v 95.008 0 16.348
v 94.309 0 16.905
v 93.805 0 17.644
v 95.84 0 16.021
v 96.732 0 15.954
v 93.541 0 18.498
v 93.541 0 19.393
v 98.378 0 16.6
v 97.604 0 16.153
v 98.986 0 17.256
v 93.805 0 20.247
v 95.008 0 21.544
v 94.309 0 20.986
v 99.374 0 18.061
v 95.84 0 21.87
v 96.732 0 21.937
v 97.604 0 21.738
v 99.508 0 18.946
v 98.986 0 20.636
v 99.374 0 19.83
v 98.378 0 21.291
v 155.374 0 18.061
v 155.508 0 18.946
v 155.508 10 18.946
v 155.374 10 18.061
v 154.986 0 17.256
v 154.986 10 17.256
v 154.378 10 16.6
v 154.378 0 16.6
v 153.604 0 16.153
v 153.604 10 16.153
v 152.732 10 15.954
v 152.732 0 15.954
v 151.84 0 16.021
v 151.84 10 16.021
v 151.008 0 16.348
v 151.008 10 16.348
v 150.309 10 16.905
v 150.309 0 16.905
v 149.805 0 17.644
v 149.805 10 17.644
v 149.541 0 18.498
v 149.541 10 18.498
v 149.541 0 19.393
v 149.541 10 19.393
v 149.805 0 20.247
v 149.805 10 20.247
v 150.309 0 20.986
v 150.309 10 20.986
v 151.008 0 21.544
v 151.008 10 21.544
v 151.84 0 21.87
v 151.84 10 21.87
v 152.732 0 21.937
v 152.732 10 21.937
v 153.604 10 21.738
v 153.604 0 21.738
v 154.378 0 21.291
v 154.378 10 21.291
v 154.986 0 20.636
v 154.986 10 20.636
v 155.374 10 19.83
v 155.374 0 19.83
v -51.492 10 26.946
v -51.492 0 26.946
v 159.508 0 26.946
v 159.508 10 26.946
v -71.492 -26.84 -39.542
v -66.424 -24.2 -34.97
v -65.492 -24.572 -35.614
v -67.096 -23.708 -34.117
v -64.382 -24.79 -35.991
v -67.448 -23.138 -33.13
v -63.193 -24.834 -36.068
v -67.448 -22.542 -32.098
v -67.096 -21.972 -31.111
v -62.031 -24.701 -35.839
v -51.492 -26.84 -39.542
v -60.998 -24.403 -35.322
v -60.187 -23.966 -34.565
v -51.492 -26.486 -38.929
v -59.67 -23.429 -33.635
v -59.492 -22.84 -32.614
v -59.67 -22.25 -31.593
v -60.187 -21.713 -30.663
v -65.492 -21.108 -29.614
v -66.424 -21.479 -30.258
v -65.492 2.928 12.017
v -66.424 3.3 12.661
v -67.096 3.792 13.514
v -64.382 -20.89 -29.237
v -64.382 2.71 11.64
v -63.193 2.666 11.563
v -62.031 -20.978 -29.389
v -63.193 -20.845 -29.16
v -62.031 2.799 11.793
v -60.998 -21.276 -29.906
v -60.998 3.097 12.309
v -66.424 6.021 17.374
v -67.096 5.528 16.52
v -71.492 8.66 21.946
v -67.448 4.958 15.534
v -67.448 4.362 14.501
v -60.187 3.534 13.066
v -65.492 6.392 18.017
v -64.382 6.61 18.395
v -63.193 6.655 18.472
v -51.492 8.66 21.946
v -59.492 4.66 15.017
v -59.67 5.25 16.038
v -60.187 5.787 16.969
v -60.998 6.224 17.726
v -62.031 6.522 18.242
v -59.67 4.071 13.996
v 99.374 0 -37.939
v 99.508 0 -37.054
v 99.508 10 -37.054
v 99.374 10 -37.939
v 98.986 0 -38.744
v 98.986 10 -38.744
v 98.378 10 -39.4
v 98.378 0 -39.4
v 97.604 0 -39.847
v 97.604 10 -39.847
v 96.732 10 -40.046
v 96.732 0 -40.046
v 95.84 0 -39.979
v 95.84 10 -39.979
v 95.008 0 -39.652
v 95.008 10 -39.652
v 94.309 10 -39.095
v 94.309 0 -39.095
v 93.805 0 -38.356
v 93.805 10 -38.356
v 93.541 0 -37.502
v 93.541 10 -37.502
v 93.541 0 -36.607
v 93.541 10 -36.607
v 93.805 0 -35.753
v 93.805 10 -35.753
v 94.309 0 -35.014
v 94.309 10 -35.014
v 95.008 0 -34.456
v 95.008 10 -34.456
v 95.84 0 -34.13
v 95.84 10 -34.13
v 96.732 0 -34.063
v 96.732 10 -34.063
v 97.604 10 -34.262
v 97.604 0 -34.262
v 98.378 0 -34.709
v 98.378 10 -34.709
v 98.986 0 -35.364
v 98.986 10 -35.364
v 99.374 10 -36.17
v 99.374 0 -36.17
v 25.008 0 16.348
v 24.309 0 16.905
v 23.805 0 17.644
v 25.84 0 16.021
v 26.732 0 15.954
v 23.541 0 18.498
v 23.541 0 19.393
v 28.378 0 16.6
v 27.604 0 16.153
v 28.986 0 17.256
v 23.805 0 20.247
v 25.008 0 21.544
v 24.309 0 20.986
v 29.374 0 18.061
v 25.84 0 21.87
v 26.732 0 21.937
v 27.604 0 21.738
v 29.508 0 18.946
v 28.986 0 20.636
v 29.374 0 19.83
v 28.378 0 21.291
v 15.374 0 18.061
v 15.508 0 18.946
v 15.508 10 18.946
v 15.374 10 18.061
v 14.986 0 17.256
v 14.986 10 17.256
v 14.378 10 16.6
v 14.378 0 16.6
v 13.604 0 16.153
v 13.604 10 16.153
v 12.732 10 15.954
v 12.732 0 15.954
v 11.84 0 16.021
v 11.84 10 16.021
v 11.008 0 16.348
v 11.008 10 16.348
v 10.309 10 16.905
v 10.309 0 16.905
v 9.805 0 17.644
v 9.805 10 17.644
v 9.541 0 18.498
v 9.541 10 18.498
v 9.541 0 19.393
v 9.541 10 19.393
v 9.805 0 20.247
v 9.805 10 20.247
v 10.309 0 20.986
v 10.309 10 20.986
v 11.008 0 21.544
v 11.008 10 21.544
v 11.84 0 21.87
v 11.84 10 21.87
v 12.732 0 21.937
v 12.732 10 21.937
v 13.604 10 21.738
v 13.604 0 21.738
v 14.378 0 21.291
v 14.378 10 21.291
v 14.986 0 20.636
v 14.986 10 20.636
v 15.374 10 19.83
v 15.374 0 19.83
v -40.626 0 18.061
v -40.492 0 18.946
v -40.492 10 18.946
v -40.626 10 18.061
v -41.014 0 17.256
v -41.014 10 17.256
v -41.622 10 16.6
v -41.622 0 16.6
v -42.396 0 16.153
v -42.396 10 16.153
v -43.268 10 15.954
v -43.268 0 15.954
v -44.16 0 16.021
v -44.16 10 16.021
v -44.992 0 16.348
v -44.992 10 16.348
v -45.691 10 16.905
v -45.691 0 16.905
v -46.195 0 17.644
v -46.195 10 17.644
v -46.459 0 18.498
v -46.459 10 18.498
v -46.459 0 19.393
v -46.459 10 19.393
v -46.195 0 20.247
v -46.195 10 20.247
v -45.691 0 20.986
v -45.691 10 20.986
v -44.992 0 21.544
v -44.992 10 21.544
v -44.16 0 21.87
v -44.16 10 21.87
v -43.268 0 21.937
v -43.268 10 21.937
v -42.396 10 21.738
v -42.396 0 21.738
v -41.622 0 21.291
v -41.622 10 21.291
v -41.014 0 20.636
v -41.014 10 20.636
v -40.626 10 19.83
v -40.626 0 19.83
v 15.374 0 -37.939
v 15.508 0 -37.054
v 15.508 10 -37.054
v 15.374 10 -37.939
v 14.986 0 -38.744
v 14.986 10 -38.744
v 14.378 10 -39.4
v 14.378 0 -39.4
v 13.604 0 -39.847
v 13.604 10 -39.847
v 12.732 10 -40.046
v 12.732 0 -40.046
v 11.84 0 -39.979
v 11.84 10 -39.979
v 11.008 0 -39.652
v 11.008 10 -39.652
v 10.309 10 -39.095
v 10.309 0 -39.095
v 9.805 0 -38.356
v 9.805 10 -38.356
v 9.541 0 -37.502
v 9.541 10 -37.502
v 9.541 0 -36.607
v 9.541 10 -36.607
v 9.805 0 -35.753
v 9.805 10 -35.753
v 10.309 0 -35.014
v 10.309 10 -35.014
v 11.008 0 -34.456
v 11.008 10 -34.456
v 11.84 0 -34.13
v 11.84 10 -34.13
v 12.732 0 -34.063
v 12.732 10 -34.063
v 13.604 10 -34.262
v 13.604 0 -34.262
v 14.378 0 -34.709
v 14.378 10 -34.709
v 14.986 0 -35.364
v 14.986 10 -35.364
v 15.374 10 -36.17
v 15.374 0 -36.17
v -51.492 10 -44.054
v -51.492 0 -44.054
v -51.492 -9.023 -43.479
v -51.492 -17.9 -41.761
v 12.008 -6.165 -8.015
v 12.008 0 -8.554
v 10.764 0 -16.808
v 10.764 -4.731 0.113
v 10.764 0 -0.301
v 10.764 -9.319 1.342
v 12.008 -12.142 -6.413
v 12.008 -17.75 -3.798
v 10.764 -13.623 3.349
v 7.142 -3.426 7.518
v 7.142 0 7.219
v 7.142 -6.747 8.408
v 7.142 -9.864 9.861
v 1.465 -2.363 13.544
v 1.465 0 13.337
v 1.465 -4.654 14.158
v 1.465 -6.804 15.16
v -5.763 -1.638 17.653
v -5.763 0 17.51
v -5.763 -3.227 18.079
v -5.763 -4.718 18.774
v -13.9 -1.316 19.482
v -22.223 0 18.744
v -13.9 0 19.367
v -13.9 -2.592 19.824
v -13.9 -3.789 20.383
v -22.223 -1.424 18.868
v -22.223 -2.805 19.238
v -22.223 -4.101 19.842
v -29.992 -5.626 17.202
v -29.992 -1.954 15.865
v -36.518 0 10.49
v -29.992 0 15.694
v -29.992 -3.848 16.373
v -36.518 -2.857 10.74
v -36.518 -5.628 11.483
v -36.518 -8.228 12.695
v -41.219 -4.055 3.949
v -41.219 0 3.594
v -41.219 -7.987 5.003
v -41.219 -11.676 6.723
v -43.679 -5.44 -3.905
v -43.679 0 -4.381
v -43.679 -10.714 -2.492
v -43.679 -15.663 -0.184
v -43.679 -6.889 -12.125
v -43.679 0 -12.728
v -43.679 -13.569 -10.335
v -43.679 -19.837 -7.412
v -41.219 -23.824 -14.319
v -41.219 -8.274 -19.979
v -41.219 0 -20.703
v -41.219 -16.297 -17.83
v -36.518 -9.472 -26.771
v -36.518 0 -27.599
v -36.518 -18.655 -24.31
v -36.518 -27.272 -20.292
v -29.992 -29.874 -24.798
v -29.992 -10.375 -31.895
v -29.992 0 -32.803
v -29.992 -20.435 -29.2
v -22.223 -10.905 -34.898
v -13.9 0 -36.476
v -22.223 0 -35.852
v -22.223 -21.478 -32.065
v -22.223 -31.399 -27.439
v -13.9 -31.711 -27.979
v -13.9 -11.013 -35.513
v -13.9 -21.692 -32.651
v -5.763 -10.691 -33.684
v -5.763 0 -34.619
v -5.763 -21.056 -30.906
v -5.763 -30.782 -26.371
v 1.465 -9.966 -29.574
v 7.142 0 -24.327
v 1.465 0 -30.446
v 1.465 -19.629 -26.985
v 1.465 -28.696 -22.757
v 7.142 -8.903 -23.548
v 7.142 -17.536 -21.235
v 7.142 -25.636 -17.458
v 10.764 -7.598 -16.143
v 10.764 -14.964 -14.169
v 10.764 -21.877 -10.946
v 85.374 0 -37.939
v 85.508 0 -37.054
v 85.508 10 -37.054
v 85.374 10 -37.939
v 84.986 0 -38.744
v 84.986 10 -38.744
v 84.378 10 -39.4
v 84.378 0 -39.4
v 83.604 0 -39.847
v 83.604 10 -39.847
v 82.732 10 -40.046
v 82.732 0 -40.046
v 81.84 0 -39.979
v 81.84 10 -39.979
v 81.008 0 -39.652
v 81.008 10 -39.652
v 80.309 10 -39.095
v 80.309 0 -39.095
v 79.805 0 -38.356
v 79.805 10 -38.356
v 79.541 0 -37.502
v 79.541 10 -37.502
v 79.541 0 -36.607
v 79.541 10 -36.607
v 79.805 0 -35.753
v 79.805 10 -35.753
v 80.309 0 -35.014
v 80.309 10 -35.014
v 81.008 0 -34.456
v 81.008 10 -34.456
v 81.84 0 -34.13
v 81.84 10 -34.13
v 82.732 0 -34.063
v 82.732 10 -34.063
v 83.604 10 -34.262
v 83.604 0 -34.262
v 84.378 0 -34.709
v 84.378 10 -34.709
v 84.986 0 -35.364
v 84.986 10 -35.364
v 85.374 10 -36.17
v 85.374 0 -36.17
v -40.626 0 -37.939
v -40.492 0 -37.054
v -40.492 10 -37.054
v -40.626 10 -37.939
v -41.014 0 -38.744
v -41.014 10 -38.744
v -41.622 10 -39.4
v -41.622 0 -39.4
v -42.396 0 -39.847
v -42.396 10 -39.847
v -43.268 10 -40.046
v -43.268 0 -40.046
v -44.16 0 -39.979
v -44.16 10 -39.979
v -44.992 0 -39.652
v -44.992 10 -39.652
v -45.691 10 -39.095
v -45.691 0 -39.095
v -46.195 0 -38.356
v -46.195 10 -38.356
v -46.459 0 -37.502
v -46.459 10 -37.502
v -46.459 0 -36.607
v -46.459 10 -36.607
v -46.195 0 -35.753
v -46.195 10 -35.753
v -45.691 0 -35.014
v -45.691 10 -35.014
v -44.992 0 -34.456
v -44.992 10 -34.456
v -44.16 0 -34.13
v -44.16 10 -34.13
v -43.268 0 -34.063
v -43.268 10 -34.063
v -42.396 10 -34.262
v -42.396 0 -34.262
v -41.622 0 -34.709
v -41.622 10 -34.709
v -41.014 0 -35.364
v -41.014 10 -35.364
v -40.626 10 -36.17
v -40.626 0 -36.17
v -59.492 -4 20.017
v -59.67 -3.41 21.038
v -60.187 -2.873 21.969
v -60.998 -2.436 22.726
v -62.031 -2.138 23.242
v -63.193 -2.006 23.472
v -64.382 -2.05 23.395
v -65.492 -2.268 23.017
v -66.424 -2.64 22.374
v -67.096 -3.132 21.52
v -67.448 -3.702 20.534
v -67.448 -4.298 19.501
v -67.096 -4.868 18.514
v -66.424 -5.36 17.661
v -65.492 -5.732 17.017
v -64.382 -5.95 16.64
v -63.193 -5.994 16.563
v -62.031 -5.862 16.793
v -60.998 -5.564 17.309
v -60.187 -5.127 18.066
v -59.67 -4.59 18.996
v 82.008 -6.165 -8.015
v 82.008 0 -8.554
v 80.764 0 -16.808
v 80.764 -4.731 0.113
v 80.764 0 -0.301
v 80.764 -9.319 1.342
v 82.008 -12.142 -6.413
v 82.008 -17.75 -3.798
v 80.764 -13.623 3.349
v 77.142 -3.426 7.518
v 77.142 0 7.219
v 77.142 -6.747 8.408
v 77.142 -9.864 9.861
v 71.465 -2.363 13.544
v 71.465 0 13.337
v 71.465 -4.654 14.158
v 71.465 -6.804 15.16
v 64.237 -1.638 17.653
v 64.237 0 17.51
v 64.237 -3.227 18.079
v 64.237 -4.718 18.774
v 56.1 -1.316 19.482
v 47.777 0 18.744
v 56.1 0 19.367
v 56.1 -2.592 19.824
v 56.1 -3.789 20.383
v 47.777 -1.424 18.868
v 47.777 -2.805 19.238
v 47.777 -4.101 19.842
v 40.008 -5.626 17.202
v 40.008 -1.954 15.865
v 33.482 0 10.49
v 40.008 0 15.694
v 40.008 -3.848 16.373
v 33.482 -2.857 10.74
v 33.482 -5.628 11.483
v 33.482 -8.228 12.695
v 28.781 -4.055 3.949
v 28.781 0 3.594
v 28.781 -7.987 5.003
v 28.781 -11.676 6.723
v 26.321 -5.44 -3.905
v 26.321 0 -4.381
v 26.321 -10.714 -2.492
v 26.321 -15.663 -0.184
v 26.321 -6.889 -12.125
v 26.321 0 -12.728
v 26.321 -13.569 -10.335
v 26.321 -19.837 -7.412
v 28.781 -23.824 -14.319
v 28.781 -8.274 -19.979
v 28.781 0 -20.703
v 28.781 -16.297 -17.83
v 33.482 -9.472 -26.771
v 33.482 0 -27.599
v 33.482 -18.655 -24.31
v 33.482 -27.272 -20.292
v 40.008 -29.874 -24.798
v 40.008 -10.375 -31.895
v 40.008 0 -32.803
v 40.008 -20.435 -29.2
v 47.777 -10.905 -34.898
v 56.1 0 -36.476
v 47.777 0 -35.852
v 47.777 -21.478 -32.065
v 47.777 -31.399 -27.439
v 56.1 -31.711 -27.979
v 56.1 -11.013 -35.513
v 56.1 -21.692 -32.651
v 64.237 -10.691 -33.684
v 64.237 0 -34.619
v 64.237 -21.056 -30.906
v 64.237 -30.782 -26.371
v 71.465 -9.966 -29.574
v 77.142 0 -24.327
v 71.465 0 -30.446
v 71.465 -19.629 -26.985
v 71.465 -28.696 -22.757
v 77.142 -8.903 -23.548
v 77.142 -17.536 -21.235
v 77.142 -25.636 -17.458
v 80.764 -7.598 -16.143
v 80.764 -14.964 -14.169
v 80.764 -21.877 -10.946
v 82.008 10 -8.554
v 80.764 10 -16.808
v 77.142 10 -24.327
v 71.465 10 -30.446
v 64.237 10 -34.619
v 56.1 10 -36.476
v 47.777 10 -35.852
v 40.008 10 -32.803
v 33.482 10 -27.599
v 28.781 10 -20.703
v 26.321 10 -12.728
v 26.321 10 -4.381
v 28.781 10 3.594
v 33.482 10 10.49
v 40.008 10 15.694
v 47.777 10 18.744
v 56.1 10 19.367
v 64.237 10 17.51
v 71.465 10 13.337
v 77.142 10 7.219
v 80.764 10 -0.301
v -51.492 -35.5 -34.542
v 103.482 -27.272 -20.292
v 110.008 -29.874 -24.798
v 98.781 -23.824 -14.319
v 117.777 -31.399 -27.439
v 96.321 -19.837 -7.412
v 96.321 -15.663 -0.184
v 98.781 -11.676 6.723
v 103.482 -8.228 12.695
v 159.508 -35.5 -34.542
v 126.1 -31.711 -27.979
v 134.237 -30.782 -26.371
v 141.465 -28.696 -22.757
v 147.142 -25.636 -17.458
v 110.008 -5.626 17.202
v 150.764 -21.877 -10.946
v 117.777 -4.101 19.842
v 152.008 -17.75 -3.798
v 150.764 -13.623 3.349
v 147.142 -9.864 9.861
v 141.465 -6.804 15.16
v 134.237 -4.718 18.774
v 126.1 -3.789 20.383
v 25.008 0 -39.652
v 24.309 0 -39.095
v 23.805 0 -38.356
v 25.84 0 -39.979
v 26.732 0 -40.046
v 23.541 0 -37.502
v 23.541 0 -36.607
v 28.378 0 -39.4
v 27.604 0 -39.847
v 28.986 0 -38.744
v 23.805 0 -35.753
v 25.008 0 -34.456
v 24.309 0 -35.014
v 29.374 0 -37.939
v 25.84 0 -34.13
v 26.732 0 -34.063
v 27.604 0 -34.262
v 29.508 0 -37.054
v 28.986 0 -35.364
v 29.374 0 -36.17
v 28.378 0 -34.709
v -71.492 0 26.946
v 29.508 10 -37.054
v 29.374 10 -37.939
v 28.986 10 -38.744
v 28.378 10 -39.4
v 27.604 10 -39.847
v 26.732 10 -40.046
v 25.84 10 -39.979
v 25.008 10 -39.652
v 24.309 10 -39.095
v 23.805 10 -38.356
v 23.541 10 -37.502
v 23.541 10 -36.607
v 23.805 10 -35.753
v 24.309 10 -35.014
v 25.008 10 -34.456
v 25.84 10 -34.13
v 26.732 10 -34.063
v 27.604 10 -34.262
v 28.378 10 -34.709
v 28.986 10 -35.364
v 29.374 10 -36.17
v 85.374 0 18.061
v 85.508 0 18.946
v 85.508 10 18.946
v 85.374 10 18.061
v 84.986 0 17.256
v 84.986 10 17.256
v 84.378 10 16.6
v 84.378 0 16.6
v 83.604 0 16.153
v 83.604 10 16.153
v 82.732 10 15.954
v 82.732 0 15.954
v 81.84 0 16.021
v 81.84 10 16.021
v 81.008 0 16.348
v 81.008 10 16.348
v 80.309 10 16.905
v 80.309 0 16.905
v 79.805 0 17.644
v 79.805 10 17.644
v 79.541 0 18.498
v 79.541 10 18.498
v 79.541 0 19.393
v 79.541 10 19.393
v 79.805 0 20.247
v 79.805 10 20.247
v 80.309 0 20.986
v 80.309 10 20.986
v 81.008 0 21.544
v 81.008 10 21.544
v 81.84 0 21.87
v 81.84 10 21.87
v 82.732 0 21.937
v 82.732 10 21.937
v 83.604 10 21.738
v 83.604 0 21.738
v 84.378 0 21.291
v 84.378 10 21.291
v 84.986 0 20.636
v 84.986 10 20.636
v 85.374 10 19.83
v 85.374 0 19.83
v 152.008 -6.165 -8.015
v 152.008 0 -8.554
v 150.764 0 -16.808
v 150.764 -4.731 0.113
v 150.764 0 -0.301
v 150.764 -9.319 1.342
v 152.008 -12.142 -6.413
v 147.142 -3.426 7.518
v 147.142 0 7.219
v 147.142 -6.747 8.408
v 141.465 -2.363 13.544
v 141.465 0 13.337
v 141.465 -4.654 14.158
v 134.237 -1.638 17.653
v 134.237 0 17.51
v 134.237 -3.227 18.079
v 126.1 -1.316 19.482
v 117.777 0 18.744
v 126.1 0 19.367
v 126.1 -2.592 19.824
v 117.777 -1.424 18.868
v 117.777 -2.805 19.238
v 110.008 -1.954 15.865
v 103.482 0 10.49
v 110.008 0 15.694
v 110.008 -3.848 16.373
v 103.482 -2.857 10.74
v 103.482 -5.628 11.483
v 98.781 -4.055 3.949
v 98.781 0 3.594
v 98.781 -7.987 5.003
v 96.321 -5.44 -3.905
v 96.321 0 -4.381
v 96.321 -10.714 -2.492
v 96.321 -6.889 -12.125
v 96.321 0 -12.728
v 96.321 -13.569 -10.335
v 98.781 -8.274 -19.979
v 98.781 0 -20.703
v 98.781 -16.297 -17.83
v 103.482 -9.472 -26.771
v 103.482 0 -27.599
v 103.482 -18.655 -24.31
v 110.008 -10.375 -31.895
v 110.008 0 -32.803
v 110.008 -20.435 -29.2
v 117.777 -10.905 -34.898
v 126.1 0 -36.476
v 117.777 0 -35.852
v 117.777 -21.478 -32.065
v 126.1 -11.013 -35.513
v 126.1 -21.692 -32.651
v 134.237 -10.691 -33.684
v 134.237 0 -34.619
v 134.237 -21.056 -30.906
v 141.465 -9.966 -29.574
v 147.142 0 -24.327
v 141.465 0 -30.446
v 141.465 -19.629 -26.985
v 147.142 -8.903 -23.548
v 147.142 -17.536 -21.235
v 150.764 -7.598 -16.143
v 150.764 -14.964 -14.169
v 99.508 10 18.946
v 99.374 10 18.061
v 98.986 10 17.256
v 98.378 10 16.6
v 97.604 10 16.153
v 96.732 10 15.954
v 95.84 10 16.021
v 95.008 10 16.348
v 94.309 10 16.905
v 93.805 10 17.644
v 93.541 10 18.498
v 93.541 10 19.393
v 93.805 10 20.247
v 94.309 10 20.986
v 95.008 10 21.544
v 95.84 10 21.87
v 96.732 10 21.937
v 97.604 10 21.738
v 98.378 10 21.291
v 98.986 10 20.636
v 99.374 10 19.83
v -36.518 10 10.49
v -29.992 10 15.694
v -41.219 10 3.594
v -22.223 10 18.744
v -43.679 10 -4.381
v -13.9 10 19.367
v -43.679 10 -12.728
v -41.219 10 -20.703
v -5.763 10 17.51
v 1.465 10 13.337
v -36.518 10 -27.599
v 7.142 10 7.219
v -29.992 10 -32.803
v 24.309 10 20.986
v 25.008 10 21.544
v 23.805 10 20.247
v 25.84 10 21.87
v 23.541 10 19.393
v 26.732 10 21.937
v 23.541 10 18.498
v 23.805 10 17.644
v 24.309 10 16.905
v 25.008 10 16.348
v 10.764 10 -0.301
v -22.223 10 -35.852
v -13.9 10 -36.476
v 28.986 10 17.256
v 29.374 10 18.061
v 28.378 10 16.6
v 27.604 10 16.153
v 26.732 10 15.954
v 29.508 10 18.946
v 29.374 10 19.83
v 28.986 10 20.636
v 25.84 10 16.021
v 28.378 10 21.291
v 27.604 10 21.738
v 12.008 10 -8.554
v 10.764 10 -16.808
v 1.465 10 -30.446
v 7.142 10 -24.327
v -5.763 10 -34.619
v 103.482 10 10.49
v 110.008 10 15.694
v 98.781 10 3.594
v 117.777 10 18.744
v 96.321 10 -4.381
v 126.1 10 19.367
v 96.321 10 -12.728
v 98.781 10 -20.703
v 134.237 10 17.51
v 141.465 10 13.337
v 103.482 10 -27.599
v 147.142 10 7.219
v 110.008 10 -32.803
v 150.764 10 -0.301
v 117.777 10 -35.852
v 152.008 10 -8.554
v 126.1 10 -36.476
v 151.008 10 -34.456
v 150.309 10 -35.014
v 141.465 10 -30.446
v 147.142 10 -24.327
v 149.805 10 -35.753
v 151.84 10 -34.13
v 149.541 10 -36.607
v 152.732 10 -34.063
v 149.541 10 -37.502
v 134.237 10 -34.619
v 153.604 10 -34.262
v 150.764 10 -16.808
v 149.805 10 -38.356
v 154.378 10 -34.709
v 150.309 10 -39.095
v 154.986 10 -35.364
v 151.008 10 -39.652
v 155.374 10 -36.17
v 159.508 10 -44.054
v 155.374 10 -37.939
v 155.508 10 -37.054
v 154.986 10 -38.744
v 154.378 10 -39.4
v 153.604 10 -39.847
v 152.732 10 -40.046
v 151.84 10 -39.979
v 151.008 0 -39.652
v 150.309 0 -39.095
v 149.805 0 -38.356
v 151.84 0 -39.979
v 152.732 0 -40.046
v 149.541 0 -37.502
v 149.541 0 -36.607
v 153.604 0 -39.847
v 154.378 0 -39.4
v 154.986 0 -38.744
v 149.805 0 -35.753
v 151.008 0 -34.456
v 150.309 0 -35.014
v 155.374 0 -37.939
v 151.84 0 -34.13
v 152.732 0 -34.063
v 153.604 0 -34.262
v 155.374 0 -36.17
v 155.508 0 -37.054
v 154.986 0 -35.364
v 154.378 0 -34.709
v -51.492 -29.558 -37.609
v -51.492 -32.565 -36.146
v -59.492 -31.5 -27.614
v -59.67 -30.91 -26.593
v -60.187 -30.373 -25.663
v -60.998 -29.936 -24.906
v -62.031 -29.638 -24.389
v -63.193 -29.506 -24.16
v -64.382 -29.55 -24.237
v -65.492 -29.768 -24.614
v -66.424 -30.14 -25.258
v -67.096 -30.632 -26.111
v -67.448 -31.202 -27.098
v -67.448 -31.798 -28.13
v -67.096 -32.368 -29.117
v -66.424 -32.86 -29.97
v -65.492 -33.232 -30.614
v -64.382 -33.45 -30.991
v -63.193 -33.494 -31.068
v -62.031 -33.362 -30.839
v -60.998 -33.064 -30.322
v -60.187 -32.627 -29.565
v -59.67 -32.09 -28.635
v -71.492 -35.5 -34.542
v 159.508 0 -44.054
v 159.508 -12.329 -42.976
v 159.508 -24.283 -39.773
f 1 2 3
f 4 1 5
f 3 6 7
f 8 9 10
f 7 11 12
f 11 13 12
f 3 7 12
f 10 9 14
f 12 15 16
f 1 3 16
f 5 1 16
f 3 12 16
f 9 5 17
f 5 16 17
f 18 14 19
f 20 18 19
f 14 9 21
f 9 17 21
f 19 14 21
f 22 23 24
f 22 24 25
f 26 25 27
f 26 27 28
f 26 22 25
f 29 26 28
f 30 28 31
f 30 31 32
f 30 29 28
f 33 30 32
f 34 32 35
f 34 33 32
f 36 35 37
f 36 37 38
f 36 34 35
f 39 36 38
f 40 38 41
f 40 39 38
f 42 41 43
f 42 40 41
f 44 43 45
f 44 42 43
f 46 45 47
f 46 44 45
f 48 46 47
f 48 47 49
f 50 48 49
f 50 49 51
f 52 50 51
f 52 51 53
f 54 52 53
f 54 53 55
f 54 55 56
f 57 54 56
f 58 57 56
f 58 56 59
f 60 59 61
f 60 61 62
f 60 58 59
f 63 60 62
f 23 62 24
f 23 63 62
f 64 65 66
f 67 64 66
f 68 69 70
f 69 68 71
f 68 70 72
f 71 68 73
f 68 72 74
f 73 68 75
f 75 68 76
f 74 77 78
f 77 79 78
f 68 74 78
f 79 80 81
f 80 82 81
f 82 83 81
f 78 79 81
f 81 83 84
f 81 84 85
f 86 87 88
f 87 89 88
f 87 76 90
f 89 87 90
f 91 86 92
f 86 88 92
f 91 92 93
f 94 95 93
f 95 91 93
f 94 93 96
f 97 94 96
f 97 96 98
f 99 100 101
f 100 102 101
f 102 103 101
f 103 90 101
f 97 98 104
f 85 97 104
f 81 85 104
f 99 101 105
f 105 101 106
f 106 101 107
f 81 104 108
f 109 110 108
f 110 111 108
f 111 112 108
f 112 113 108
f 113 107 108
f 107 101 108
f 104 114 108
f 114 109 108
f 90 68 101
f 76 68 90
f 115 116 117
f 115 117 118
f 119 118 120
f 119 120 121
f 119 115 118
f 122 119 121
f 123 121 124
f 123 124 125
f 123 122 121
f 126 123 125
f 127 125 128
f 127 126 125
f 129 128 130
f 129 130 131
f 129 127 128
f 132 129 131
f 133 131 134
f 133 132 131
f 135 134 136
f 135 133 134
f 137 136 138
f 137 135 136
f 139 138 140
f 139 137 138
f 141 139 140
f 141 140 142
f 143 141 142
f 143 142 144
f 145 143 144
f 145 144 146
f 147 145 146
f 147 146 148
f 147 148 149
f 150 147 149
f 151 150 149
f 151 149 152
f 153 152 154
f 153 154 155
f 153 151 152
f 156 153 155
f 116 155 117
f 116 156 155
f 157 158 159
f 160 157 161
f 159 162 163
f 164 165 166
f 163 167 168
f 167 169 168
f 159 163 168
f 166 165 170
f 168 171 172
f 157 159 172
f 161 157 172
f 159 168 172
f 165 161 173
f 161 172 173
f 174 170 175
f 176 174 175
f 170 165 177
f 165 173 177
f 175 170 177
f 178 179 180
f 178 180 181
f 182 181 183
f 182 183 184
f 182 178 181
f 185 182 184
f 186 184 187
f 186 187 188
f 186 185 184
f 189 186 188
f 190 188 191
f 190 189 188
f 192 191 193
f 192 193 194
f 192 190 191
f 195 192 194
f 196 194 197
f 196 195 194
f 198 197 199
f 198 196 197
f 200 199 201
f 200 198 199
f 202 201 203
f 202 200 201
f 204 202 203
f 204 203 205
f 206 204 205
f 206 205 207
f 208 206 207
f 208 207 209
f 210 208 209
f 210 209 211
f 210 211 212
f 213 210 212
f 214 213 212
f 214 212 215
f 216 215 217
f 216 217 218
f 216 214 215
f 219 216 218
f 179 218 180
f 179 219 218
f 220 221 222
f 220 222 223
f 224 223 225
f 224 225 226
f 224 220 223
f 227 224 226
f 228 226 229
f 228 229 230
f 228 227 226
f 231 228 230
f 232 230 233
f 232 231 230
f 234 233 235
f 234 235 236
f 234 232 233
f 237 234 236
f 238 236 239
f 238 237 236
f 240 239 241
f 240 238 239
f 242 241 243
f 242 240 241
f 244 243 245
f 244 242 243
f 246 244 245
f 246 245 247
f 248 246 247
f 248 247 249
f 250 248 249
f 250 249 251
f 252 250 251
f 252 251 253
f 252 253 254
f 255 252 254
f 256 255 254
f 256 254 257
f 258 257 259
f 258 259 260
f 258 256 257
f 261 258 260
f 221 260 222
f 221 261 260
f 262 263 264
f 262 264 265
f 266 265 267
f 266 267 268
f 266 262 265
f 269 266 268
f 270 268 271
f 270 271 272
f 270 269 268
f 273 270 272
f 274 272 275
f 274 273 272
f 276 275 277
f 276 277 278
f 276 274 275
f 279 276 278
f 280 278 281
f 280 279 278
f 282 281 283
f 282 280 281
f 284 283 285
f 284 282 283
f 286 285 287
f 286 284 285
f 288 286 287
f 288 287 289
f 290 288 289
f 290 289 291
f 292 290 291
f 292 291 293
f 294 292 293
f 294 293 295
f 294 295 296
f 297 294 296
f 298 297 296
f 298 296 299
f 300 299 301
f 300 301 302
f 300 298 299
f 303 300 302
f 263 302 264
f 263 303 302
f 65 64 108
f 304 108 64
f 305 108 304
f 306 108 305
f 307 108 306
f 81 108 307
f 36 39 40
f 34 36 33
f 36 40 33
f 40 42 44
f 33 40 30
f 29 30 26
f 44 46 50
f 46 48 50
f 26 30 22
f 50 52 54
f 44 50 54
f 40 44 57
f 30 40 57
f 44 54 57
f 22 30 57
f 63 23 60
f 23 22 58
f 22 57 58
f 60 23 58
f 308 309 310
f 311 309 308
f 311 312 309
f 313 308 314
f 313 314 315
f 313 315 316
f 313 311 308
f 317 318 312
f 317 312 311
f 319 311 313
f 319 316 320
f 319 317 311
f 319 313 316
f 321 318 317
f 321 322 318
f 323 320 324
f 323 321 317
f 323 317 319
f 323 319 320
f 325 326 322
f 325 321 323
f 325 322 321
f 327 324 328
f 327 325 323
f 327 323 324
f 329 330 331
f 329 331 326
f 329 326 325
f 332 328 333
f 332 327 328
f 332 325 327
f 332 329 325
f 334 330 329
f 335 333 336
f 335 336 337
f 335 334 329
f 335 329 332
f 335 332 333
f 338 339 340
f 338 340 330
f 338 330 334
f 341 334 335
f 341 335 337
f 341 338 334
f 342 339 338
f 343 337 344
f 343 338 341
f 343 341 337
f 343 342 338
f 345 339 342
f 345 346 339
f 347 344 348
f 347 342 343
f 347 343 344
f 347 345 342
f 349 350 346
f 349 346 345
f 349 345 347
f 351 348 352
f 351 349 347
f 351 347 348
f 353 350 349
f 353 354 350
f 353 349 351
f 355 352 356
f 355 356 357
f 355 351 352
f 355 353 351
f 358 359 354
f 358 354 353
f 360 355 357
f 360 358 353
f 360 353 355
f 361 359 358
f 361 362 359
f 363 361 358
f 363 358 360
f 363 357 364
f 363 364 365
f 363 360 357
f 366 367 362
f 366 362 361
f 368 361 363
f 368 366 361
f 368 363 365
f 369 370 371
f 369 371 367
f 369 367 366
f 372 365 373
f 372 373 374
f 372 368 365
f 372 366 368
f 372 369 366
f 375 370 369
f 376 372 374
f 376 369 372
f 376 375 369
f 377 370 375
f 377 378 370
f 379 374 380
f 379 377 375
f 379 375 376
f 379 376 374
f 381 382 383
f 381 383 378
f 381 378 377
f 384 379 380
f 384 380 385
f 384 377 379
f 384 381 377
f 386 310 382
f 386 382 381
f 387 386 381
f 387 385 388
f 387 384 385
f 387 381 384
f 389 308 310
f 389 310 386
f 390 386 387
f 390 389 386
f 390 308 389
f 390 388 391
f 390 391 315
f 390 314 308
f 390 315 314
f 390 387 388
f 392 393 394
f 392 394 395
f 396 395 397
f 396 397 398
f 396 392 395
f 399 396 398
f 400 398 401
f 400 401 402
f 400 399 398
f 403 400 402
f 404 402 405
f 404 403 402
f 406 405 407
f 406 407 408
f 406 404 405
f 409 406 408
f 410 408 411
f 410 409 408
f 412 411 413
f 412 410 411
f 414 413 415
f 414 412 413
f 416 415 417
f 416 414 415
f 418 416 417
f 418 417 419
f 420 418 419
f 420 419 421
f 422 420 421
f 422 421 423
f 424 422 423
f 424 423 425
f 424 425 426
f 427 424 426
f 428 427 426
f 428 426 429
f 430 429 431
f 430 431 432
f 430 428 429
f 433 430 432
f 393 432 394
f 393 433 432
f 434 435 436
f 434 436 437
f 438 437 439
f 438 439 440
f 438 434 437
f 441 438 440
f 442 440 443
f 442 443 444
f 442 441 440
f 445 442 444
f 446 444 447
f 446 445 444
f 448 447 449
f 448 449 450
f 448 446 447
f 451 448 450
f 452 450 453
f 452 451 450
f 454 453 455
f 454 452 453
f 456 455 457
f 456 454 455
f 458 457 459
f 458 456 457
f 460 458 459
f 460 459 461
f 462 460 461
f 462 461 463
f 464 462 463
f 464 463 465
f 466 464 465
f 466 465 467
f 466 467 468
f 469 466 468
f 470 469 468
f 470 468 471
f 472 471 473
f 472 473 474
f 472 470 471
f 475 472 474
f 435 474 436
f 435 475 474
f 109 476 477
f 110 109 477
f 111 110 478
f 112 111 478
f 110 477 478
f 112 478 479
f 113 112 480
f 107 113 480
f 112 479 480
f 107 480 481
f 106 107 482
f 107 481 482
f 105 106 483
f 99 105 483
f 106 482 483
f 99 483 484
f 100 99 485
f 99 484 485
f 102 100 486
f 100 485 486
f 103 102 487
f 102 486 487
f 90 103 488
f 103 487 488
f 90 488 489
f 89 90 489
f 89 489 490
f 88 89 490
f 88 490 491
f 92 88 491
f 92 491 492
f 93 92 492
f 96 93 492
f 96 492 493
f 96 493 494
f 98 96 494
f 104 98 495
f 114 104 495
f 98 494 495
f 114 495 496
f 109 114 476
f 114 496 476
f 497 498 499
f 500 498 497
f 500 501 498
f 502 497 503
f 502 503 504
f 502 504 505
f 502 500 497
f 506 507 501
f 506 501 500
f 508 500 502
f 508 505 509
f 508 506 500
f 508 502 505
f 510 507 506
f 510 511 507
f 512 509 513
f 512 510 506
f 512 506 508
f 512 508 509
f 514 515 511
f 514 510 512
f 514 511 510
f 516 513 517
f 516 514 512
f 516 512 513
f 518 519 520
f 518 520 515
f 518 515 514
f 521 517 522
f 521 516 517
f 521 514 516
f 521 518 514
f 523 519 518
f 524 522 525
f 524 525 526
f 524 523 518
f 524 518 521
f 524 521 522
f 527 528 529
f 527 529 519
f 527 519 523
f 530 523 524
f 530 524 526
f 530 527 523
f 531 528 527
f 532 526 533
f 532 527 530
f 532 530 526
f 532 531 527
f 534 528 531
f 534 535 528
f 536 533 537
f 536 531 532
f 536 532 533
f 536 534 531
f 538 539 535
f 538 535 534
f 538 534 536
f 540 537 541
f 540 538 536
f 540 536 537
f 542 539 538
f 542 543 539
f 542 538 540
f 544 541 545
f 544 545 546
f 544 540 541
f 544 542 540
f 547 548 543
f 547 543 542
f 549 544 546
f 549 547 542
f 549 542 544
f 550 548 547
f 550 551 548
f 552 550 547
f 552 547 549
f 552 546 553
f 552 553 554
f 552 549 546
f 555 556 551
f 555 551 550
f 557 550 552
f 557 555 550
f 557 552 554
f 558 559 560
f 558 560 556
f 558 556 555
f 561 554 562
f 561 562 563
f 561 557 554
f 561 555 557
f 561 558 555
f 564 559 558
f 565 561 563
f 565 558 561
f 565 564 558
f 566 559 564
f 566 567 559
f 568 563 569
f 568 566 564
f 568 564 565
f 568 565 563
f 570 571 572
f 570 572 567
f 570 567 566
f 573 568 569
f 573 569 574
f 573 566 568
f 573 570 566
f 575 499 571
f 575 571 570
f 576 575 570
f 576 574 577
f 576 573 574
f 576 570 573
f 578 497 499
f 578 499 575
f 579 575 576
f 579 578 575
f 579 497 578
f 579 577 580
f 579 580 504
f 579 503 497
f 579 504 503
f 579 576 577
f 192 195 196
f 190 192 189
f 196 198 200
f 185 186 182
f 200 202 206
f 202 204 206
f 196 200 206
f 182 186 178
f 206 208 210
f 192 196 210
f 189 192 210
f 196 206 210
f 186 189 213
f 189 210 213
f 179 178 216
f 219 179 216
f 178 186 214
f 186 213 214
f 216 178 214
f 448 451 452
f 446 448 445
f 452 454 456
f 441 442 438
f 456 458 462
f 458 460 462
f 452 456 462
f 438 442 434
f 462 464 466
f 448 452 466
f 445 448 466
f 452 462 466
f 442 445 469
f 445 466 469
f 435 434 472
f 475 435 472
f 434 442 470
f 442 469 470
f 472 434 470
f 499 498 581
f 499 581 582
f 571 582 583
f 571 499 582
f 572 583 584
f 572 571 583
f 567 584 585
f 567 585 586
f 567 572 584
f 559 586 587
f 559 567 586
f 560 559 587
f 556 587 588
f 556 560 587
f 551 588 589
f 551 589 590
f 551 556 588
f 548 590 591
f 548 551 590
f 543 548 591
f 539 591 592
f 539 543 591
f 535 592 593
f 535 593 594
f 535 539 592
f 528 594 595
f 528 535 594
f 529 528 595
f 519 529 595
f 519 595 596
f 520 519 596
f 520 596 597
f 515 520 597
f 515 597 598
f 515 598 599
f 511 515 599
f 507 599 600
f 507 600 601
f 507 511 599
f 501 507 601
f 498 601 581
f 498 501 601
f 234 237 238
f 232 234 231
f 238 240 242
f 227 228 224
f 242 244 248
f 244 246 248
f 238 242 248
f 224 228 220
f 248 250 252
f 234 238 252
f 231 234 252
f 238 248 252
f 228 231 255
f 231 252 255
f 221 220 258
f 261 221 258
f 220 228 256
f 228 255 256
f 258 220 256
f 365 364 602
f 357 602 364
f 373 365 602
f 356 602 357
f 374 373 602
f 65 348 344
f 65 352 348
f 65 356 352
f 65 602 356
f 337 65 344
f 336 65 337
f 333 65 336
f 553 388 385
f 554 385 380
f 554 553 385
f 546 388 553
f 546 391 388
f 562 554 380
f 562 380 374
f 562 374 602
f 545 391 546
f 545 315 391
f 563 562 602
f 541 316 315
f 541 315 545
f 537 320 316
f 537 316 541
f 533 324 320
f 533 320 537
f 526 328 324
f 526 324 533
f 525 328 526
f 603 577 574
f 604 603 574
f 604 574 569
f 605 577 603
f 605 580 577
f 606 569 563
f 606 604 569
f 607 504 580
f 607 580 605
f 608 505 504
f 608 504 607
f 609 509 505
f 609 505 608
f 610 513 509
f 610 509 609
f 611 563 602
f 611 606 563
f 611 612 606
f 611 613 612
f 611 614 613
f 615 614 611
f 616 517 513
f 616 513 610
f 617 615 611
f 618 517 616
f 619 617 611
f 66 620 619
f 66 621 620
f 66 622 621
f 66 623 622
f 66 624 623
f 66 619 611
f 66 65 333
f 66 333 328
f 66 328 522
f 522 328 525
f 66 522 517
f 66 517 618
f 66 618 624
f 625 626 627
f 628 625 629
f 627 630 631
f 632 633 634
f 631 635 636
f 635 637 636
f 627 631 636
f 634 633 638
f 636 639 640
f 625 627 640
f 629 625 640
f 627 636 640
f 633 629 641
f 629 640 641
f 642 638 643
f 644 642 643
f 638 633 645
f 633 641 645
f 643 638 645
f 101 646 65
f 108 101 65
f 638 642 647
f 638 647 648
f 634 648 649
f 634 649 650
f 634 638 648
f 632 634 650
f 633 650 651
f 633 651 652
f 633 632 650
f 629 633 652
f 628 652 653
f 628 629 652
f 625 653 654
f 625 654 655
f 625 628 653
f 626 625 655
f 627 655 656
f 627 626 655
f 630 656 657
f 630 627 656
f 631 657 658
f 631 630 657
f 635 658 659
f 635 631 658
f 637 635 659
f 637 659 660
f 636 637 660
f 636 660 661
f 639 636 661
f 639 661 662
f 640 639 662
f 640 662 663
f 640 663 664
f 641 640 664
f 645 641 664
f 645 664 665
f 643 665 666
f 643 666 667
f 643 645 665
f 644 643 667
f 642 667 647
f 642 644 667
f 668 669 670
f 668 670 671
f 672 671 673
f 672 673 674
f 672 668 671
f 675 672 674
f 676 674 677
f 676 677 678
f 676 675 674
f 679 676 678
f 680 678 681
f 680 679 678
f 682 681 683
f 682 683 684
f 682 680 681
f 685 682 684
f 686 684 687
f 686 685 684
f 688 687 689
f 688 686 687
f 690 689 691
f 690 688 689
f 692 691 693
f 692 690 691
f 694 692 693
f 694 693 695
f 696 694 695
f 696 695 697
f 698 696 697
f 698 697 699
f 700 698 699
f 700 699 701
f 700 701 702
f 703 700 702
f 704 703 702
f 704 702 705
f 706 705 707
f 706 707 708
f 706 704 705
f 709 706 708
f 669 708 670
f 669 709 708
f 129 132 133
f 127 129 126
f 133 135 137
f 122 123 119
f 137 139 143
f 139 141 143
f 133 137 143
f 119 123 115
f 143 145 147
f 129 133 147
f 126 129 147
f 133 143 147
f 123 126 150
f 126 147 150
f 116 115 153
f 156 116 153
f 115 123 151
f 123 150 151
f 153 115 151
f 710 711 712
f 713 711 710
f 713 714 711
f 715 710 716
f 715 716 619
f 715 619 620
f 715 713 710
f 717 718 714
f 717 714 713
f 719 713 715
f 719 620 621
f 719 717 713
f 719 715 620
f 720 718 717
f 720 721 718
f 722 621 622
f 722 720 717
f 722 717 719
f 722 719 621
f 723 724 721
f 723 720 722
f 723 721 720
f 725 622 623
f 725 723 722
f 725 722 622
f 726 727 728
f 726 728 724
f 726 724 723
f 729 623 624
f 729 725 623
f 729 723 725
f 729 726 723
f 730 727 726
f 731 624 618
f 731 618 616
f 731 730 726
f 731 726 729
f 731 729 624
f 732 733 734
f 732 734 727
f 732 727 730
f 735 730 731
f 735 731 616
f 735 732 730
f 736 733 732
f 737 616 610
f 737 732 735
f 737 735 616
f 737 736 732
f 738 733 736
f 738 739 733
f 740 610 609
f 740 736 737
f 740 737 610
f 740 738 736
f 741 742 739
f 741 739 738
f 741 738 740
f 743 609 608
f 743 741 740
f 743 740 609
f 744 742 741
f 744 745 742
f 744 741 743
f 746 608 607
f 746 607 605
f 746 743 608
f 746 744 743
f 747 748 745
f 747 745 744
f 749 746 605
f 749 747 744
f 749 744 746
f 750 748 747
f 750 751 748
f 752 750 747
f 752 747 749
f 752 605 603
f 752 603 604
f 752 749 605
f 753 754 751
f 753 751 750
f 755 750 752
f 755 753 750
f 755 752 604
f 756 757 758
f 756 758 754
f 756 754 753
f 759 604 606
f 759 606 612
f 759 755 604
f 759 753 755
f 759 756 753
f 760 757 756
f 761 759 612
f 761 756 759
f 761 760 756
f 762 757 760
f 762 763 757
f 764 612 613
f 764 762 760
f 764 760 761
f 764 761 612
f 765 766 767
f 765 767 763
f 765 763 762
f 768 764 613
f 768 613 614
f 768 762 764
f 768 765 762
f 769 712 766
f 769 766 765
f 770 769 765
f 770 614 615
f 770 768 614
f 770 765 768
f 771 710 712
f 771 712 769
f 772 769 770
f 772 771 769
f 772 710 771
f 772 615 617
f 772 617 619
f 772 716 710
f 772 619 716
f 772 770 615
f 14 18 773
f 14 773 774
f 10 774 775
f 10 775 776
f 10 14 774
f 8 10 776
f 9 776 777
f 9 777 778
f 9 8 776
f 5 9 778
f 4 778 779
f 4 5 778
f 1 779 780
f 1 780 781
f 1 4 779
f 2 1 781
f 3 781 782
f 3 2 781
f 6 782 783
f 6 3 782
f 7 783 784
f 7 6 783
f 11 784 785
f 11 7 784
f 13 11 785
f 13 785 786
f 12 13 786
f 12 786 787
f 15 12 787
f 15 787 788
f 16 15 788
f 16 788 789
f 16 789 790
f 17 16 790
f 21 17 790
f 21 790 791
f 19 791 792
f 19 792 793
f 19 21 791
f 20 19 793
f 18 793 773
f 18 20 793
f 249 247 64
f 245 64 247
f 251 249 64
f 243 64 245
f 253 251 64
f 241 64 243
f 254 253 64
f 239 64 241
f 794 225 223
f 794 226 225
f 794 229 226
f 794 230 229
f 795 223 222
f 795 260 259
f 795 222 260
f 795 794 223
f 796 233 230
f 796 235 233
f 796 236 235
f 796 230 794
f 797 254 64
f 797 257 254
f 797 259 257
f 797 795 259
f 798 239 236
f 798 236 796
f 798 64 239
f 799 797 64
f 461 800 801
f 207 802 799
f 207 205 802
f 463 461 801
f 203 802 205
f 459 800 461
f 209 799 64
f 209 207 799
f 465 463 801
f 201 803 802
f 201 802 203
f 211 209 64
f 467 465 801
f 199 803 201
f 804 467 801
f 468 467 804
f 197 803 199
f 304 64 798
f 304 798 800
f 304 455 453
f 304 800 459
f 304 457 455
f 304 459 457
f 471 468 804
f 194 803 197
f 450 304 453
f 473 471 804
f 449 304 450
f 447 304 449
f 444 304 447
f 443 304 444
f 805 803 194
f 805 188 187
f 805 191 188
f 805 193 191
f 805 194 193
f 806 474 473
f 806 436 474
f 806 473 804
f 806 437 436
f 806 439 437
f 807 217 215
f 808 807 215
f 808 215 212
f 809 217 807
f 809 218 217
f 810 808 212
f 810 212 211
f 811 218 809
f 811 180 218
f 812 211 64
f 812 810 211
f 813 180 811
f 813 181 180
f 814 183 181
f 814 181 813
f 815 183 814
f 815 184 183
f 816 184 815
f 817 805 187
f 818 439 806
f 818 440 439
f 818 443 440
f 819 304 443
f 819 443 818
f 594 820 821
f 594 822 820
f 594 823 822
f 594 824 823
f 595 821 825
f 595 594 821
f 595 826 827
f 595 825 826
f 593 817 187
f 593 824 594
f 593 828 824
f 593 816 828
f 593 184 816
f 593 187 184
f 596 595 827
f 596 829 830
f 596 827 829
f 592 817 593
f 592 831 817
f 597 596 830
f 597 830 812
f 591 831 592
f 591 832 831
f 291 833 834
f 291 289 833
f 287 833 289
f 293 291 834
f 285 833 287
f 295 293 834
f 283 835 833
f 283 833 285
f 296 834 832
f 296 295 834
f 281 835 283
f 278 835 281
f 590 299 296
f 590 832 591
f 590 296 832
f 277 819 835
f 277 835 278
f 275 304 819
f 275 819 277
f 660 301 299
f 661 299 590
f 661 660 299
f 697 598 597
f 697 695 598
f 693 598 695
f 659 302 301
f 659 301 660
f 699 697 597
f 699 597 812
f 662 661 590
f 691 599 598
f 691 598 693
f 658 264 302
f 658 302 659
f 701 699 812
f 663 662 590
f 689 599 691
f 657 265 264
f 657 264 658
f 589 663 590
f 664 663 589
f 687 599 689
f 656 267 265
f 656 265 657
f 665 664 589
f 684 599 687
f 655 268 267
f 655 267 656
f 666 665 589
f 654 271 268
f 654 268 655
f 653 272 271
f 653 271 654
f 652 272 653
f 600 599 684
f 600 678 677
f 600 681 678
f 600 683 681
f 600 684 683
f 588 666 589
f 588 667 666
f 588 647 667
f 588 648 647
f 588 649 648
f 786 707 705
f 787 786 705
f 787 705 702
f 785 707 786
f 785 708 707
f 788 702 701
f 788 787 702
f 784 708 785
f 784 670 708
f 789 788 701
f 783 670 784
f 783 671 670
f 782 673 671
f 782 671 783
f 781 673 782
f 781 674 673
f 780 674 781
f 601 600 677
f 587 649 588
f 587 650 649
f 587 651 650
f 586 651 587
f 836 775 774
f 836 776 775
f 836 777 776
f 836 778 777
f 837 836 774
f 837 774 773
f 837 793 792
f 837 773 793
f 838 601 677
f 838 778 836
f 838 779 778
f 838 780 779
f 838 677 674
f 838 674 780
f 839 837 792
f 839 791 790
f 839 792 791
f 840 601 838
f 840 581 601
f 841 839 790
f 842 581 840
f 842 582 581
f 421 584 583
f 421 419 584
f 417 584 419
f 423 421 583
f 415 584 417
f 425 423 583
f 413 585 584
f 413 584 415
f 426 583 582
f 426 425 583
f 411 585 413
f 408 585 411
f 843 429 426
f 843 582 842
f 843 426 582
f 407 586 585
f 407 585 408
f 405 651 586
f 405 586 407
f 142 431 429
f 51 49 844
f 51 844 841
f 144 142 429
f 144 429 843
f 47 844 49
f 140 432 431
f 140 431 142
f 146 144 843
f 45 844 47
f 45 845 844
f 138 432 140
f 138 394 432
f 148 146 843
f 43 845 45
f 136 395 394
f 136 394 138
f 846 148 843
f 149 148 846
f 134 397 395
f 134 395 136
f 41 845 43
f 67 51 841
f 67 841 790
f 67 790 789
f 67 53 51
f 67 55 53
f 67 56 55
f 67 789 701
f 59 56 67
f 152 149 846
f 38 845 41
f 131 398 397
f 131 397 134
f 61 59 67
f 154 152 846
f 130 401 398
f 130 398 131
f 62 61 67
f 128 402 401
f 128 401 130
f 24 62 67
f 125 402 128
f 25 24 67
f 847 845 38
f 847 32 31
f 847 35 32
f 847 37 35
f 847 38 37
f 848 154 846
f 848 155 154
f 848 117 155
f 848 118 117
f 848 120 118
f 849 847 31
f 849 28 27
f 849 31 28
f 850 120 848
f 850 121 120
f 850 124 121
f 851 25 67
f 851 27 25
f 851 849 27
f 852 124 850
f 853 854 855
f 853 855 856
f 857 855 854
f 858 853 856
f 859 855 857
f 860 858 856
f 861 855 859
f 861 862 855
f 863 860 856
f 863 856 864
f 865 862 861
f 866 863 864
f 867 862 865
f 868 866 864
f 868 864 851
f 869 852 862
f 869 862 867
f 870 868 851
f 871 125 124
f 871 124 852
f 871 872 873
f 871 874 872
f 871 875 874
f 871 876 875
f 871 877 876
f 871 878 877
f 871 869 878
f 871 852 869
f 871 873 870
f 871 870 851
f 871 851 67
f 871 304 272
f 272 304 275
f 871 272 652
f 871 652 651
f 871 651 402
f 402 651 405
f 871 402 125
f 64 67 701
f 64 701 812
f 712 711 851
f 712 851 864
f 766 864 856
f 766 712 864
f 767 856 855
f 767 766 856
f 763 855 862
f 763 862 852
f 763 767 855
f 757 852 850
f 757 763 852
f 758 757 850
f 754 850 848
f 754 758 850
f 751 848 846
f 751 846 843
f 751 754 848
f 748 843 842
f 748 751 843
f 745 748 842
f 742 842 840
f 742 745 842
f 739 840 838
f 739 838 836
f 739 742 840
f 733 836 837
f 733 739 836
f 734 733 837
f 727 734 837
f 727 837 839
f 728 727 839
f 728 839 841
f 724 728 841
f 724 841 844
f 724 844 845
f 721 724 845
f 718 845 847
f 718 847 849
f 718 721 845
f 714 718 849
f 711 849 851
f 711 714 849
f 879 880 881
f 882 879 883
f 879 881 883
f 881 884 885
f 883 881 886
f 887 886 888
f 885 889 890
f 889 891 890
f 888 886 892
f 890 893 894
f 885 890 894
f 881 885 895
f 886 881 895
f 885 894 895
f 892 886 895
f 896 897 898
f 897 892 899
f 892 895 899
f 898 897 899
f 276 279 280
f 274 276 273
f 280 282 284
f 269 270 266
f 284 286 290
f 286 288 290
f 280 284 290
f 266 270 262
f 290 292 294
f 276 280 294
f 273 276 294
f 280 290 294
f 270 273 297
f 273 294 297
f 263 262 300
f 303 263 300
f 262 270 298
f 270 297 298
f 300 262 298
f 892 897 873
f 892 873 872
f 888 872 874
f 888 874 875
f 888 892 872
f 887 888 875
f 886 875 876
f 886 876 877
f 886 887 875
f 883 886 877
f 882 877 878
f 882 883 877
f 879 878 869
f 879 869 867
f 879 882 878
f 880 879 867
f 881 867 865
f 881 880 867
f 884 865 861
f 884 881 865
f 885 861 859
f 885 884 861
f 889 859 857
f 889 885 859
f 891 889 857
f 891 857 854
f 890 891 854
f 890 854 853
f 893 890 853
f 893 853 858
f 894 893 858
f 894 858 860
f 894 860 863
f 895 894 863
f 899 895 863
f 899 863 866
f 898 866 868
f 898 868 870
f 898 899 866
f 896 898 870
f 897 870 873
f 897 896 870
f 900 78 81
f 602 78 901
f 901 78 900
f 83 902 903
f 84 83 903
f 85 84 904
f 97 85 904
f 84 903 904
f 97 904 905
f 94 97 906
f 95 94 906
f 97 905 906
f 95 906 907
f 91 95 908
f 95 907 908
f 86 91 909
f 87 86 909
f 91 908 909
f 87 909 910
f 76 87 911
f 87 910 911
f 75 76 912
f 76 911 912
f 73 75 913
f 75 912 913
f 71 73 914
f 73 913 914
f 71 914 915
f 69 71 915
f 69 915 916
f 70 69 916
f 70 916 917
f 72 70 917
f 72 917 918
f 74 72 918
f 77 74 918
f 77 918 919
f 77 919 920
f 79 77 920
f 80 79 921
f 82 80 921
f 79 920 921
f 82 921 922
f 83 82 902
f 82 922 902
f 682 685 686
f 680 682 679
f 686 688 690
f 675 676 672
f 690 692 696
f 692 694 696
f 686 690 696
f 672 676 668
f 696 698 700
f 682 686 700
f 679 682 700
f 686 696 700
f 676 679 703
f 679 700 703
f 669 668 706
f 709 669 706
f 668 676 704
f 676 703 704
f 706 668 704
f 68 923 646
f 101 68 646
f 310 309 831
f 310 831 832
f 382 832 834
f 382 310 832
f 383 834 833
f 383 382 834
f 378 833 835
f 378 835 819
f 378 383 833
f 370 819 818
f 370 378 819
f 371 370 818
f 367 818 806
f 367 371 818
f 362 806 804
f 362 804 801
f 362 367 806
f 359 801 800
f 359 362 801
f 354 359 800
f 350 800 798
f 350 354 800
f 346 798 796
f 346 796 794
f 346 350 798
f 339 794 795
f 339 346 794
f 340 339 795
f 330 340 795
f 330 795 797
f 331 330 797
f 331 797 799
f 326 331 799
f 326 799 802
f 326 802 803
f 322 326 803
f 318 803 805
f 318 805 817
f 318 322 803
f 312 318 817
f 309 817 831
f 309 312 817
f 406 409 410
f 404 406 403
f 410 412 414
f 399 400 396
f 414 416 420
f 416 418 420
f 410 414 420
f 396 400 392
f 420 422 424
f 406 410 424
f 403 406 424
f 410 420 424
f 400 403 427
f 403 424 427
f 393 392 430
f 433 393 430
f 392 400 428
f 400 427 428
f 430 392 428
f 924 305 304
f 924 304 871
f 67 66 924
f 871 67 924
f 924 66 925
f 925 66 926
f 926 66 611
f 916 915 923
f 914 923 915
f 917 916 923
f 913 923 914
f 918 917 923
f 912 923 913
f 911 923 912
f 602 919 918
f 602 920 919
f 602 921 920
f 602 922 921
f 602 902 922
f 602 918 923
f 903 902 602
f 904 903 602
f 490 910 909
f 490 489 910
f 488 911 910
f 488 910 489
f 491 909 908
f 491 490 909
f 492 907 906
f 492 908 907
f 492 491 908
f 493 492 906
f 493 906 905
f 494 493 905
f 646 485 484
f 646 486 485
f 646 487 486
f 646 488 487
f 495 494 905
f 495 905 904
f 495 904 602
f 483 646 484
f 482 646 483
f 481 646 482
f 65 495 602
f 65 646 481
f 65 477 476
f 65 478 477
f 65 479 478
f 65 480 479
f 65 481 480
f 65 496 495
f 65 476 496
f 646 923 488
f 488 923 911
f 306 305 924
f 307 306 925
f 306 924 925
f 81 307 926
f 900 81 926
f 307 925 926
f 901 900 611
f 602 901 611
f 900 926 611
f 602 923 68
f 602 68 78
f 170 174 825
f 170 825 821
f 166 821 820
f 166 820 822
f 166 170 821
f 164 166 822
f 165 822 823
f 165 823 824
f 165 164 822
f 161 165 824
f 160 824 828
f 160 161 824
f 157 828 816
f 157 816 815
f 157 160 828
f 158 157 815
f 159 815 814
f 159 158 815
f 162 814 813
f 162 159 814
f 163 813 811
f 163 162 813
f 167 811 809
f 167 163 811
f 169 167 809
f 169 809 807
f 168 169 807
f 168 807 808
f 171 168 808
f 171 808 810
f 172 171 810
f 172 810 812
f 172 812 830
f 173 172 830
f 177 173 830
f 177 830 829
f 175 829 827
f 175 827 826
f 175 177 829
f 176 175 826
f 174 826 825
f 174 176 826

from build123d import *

# Parameters (mm, degrees)
SKETCH1_W           = 71
SKETCH1_H           = 71
SKETCH1_R           = 3
SKETCH1_R_2         = 28
BOSS_EXTRUDE1_DEPTH = 10
SKETCH2_W           = 71
SKETCH2_H           = 71
SKETCH2_R           = 28
REVOLVE1_ANGLE      = 30
LPATTERN1_COUNT     = 3
LPATTERN1_PITCH     = 70
SKETCH3_W           = 20
SKETCH3_H           = 71
BOSS_EXTRUDE2_DEPTH = 10
SKETCH4_R           = 4
CUT_EXTRUDE1_DEPTH  = 10


with BuildPart() as part:
    # Sketch1 → Boss-Extrude1 (new body)
    with BuildSketch(Plane(origin=(0, 0, 0), x_dir=(1, 0, 0), z_dir=(0, 1, 0))):
        with Locations((-15.992227979, 8.554404145)):
            Rectangle(SKETCH1_W, SKETCH1_H)
        with Locations((-43.492227979, 37.054404145)):
            Circle(SKETCH1_R, mode=Mode.SUBTRACT)
        with Locations((12.507772021, 37.054404145)):
            Circle(SKETCH1_R, mode=Mode.SUBTRACT)
        with Locations((12.507772021, -18.945595855)):
            Circle(SKETCH1_R, mode=Mode.SUBTRACT)
        with Locations((-43.492227979, -18.945595855)):
            Circle(SKETCH1_R, mode=Mode.SUBTRACT)
        with Locations((-15.992227979, 8.554404145)):
            Circle(SKETCH1_R_2, mode=Mode.SUBTRACT)
    boss_extrude1 = extrude(amount=BOSS_EXTRUDE1_DEPTH)

    # Sketch2 → Revolve1 (revolve)
    with BuildSketch(Plane.XZ):
        with Locations((-15.992227979, -8.554404145)):
            Rectangle(SKETCH2_W, SKETCH2_H)
        with Locations((-15.992227979, -8.554404145)):
            Circle(SKETCH2_R, mode=Mode.SUBTRACT)
    revolve1 = revolve(axis=Axis((19.507772021, 0, 26.945595855), (-1, 0, 0)), revolution_arc=REVOLVE1_ANGLE)

    # LPattern1: Boss-Extrude1, Revolve1 ×3
    with Locations(*[(i * LPATTERN1_PITCH, 0, 0) for i in range(1, LPATTERN1_COUNT)]):
        add(boss_extrude1)
        add(revolve1)

    # Sketch3 → Boss-Extrude2 (add)
    with BuildSketch(Plane(origin=(0, -11.667785265, 6.736398964), x_dir=(1, 0, 0), z_dir=(0, -0.866025404, 0.5))):
        with Locations((-61.492227979, -12.16442947)):
            Rectangle(SKETCH3_W, SKETCH3_H)
    extrude(amount=-BOSS_EXTRUDE2_DEPTH)

    # Sketch4 → Cut-Extrude1 (cut)
    with BuildSketch(Plane(origin=(0, -11.667785265, 6.736398964), x_dir=(1, 0, 0), z_dir=(0, -0.866025404, 0.5))):
        with Locations((-63.492227979, 15.33557053)):
            Circle(SKETCH4_R)
        with Locations((-63.492227979, -39.66442947)):
            Circle(SKETCH4_R)
    extrude(amount=-CUT_EXTRUDE1_DEPTH, mode=Mode.SUBTRACT)


solid = part.part
